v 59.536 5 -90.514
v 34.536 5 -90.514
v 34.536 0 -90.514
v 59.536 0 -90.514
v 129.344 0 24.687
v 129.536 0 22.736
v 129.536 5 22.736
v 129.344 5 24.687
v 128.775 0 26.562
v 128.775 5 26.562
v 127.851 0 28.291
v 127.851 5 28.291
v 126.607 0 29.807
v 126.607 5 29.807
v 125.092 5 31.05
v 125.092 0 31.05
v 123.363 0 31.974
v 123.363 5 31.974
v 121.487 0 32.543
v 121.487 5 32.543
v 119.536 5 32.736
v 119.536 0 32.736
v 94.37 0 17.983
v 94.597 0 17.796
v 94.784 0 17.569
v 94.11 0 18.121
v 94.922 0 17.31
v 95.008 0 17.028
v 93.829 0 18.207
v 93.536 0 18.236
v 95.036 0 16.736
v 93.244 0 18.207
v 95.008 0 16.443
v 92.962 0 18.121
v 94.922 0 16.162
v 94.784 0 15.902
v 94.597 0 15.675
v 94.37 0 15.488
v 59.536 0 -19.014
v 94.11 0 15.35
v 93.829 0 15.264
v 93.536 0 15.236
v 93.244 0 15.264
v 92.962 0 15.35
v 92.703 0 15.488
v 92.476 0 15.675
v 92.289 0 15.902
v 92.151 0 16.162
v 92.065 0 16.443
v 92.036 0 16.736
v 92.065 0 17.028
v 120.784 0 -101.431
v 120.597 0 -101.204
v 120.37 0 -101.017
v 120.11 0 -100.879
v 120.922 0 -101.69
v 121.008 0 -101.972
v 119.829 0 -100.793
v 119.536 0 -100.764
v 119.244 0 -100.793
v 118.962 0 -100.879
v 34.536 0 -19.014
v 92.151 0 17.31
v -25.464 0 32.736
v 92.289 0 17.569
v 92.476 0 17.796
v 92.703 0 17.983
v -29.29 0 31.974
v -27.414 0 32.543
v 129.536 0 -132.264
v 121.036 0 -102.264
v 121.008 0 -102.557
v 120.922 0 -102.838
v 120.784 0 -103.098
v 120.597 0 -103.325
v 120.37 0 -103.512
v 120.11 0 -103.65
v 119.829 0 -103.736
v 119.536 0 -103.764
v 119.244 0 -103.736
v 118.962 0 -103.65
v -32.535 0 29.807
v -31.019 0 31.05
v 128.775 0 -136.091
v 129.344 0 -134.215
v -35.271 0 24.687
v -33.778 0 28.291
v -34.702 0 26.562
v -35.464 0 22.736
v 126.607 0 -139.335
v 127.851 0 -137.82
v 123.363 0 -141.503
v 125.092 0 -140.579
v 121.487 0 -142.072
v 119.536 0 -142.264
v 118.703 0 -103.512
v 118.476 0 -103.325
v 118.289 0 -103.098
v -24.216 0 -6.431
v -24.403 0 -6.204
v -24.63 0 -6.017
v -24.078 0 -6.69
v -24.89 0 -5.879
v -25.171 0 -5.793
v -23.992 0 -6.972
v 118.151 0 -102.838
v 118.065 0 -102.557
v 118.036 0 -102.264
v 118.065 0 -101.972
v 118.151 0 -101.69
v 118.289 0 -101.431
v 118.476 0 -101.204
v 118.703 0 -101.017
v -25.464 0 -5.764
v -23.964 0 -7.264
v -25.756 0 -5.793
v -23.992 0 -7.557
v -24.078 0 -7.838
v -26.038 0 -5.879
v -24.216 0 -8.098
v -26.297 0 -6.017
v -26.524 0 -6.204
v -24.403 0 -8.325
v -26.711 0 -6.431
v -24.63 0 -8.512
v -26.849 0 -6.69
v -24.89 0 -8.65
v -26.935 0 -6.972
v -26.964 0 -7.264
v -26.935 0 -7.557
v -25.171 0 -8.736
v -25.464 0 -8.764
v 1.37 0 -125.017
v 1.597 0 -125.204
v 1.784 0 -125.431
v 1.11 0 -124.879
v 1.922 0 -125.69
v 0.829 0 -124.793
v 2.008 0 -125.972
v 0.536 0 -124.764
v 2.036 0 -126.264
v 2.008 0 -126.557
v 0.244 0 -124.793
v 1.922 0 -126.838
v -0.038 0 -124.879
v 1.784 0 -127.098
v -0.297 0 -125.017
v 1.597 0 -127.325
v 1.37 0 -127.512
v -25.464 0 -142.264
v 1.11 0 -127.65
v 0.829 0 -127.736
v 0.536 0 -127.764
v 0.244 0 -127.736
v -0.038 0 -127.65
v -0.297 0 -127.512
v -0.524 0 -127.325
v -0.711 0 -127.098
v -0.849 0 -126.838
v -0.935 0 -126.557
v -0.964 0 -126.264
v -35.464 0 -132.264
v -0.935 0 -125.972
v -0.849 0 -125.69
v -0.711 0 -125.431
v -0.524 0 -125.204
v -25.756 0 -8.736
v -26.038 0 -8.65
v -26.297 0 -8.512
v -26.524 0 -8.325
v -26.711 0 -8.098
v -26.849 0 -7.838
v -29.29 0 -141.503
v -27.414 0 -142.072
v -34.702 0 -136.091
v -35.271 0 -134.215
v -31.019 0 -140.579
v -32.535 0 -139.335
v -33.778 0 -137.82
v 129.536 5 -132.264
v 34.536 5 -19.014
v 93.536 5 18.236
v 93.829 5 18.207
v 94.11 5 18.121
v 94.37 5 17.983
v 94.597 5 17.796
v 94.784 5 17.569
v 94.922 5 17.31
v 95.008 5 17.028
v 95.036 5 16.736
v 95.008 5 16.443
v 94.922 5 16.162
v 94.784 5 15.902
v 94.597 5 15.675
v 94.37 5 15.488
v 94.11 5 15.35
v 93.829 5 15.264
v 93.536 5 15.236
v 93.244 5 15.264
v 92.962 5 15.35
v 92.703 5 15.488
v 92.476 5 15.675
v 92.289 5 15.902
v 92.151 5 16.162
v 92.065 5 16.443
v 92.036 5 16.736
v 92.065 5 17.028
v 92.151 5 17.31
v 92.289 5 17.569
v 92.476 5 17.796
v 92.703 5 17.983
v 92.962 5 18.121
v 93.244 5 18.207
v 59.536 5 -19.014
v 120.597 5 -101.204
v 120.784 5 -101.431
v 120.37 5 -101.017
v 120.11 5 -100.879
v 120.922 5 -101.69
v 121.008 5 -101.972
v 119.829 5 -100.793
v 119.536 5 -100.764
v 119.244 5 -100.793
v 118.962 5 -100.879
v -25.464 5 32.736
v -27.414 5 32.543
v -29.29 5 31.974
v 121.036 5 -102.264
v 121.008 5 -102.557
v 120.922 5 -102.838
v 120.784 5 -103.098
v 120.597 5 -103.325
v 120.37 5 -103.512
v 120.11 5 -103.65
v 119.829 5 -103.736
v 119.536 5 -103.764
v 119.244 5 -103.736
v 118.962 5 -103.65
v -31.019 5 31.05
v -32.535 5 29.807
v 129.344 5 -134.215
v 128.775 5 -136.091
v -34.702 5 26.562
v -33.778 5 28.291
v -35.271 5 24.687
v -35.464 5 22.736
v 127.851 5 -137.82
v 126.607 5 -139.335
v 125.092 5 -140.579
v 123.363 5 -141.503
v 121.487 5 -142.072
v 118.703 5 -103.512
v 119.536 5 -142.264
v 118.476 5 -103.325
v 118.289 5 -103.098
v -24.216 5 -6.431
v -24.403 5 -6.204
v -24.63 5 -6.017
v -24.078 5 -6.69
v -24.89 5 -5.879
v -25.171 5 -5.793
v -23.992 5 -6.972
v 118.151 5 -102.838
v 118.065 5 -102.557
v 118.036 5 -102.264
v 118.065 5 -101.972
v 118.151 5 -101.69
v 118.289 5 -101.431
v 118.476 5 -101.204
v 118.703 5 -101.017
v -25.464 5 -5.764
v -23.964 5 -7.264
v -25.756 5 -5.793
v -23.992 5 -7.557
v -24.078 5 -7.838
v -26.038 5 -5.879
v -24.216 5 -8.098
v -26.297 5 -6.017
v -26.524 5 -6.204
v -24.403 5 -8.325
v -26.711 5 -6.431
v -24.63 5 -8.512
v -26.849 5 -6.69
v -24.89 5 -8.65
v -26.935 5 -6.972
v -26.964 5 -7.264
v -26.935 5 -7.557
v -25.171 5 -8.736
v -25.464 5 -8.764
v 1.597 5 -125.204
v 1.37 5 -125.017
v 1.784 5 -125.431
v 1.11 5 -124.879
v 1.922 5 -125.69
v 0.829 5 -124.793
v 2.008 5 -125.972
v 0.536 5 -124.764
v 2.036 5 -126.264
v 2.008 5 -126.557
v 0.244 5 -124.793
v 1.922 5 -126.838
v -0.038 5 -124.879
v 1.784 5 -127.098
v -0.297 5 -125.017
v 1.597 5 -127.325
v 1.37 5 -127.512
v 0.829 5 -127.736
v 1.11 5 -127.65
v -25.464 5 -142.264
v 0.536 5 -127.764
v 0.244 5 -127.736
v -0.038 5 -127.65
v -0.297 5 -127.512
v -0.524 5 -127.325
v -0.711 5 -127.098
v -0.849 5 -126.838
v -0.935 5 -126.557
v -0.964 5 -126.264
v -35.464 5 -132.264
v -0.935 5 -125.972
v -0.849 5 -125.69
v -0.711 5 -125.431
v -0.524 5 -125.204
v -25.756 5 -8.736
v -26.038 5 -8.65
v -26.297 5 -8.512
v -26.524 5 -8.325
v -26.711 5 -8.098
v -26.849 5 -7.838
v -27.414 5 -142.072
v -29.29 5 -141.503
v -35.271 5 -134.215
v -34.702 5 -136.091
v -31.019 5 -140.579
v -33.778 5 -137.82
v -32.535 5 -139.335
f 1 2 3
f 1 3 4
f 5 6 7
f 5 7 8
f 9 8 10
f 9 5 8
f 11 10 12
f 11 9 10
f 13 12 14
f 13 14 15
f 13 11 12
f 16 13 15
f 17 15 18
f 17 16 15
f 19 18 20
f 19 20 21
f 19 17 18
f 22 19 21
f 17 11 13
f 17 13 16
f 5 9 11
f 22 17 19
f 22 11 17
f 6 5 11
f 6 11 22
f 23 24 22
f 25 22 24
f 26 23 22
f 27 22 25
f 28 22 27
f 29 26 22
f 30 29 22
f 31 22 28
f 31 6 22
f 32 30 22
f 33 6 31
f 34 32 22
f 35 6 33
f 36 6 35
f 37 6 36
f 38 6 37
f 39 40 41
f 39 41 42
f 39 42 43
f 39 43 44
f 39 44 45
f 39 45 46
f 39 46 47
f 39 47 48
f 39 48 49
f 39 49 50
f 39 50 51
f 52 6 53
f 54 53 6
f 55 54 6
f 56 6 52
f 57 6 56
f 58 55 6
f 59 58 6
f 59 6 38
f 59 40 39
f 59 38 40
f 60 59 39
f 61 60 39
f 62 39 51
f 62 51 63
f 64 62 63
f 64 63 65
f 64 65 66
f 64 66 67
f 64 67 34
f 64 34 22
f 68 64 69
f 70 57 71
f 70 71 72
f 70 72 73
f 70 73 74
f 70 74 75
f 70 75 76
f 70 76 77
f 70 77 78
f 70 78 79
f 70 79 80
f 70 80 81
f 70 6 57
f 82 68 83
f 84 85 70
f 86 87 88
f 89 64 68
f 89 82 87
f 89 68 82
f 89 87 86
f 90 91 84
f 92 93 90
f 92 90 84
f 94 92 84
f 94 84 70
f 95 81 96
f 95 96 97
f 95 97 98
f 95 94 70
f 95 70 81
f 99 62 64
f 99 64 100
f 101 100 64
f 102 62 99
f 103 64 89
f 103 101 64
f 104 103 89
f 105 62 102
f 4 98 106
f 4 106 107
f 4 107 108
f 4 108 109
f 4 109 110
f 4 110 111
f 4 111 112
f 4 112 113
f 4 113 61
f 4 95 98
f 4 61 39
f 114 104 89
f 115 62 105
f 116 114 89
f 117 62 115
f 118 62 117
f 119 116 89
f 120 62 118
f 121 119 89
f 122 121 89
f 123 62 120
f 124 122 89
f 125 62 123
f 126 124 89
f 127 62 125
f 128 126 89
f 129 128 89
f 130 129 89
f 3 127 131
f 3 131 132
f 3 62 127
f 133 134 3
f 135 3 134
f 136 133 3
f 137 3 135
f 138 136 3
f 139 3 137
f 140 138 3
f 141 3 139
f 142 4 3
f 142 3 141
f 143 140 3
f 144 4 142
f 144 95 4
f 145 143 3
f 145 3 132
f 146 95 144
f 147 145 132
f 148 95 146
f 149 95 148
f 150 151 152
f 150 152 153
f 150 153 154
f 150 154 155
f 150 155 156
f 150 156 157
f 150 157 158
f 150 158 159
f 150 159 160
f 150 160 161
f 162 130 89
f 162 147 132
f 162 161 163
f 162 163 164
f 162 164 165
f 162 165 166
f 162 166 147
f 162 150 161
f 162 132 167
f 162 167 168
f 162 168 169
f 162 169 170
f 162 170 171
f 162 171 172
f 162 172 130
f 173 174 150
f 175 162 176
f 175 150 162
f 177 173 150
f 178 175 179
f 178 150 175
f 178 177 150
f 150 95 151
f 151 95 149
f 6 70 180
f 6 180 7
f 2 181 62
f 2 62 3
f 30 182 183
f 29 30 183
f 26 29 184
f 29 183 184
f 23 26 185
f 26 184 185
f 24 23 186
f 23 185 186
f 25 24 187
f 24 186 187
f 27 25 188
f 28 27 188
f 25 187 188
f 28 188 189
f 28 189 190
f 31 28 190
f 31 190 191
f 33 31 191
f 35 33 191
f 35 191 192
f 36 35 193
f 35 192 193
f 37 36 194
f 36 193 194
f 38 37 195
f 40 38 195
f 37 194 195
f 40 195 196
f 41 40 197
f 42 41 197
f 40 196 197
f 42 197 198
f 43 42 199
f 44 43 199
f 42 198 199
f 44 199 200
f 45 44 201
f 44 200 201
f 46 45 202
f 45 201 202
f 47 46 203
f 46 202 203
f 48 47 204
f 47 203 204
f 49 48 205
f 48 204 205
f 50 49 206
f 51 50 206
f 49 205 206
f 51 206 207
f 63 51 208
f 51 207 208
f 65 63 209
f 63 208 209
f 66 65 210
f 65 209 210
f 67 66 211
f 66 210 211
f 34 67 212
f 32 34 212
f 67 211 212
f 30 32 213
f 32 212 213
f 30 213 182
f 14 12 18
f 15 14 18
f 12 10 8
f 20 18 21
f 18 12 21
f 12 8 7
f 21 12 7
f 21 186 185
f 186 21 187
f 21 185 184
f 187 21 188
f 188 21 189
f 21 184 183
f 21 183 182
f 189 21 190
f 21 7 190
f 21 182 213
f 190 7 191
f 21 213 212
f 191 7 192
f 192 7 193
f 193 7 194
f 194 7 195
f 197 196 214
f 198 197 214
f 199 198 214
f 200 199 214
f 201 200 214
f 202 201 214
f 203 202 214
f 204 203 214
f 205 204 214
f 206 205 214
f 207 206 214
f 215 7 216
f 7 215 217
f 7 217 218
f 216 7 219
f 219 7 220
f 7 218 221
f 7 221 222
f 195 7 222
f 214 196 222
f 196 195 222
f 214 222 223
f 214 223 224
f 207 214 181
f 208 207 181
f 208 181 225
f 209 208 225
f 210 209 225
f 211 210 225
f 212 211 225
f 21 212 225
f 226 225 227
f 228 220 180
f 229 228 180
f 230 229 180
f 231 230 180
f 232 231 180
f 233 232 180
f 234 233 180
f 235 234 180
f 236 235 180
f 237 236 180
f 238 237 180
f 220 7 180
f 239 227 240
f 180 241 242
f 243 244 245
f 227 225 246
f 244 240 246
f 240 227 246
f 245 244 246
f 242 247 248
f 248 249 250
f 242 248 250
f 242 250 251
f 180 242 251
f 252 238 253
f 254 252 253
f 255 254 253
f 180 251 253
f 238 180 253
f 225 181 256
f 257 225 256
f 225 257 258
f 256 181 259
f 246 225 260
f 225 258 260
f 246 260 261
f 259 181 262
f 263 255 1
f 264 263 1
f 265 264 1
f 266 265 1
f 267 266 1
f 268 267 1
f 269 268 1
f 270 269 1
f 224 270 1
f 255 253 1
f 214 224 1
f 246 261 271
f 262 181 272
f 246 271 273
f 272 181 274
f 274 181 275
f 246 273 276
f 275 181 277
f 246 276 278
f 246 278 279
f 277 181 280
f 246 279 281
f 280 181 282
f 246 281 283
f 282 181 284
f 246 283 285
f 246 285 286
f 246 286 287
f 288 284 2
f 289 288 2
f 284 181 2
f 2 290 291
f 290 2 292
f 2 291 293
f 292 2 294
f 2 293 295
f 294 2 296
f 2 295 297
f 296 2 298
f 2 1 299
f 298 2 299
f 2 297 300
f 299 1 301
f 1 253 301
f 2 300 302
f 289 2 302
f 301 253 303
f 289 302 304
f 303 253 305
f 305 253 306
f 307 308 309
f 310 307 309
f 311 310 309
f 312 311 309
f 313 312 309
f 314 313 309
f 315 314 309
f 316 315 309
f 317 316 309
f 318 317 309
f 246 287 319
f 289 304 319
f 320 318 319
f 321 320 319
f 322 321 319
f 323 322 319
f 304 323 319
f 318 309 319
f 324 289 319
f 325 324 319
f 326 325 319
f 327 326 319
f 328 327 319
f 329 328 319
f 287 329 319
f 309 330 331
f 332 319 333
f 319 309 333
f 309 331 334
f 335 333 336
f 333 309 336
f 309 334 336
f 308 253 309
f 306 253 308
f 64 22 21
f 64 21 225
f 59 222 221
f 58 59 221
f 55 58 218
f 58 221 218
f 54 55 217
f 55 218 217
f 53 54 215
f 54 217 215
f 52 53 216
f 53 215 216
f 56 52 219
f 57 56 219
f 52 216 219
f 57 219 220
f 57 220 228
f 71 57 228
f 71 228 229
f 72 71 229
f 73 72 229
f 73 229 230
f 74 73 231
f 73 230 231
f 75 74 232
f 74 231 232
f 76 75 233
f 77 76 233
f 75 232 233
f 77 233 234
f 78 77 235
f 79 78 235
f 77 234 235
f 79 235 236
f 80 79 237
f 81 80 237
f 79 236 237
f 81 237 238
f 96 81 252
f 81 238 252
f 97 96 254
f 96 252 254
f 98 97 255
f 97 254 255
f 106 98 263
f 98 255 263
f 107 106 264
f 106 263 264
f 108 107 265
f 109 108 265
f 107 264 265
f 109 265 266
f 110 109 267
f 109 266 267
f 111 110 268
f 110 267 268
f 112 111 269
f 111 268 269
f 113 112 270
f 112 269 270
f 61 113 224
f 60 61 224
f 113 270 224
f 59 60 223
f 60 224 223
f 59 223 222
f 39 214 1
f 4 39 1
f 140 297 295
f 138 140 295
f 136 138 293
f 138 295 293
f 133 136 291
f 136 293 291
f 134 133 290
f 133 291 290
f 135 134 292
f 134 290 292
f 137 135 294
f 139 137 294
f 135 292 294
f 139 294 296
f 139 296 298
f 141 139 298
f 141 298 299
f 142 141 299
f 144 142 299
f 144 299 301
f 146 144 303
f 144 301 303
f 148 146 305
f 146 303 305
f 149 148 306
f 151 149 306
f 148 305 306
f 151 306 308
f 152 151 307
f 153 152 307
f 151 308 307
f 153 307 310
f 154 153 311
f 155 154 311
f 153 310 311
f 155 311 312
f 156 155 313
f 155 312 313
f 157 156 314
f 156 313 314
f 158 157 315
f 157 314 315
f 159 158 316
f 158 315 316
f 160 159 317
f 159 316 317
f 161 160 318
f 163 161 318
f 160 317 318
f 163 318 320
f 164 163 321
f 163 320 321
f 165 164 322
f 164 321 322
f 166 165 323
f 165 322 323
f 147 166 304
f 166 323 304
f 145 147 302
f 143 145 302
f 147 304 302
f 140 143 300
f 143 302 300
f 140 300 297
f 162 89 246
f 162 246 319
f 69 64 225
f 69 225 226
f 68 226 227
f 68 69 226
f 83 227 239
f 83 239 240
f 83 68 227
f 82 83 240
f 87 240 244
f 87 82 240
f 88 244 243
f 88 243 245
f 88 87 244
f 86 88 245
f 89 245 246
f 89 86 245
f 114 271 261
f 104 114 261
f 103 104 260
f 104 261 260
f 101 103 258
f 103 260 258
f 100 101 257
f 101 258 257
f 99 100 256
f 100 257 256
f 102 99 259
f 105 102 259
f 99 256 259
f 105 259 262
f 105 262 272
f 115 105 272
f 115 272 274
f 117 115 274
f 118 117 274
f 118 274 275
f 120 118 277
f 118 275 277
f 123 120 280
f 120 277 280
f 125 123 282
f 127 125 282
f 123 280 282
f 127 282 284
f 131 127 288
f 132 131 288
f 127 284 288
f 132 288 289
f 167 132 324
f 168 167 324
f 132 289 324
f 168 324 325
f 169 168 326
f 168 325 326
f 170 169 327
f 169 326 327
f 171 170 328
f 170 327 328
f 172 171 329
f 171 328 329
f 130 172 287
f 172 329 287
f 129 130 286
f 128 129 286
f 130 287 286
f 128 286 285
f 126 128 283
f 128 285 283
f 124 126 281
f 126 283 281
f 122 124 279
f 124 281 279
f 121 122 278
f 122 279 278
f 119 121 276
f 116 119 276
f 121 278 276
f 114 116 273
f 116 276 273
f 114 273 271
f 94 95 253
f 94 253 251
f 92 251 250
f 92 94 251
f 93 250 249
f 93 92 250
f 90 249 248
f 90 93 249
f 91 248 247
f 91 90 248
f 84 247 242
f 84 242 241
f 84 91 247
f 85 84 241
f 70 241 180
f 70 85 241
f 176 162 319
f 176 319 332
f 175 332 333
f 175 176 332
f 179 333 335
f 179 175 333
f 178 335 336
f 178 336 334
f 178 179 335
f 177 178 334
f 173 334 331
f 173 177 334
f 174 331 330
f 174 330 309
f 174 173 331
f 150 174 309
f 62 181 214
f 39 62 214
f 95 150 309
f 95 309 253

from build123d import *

# Parameters (mm, degrees)
RESSALTO_EXTRUS_O1_DEPTH = 5
ESBO_O2_R                = 1.5
CORTE_EXTRUS_O1_DEPTH    = 5
ESBO_O3_W                = 25
ESBO_O3_H                = 71.5
CORTE_EXTRUS_O2_DEPTH    = 5


with BuildPart() as part:
    # Esboço1 → Ressalto-extrusão1 (new body)
    with BuildSketch(Plane(origin=(0, 0, 0), x_dir=(1, 0, 0), z_dir=(0, 1, 0))):
        with BuildLine():
            Line((-25.463589741, 142.264378701), (119.536410259, 142.264378701))
            ThreePointArc((119.536410259, 142.264378701), (126.607478071, 139.335446513), (129.536410259, 132.264378701))
            Line((129.536410259, 132.264378701), (129.536410259, -22.735621299))
            ThreePointArc((129.536410259, -22.735621299), (126.607478071, -29.806689111), (119.536410259, -32.735621299))
            Line((119.536410259, -32.735621299), (-25.463589741, -32.735621299))
            ThreePointArc((-25.463589741, -32.735621299), (-32.534657553, -29.806689111), (-35.463589741, -22.735621299))
            Line((-35.463589741, -22.735621299), (-35.463589741, 132.264378701))
            ThreePointArc((-35.463589741, 132.264378701), (-32.534657553, 139.335446513), (-25.463589741, 142.264378701))
        make_face()
    extrude(amount=RESSALTO_EXTRUS_O1_DEPTH)

    # Esboço2 → Corte-extrusão1 (cut)
    with BuildSketch(Plane(origin=(0, 5, 0), x_dir=(1, 0, 0), z_dir=(0, 1, 0))):
        with Locations(Location((-25.463589741, 7.264378701, 0), (0, 0, 270))):
            Circle(ESBO_O2_R)
        with Locations(Location((0.536410259, 126.264378701, 0), (0, 0, 270))):
            Circle(ESBO_O2_R)
        with Locations(Location((119.536410259, 102.264378701, 0), (0, 0, 270))):
            Circle(ESBO_O2_R)
        with Locations(Location((93.536410259, -16.735621299, 0), (0, 0, 270))):
            Circle(ESBO_O2_R)
    extrude(amount=-CORTE_EXTRUS_O1_DEPTH, mode=Mode.SUBTRACT)

    # Esboço3 → Corte-extrusão2 (cut)
    with BuildSketch(Plane(origin=(0, 5, 0), x_dir=(1, 0, 0), z_dir=(0, 1, 0))):
        with Locations((47.036410259, 54.764378701)):
            Rectangle(ESBO_O3_W, ESBO_O3_H)
    extrude(amount=-CORTE_EXTRUS_O2_DEPTH, mode=Mode.SUBTRACT)


solid = part.part
